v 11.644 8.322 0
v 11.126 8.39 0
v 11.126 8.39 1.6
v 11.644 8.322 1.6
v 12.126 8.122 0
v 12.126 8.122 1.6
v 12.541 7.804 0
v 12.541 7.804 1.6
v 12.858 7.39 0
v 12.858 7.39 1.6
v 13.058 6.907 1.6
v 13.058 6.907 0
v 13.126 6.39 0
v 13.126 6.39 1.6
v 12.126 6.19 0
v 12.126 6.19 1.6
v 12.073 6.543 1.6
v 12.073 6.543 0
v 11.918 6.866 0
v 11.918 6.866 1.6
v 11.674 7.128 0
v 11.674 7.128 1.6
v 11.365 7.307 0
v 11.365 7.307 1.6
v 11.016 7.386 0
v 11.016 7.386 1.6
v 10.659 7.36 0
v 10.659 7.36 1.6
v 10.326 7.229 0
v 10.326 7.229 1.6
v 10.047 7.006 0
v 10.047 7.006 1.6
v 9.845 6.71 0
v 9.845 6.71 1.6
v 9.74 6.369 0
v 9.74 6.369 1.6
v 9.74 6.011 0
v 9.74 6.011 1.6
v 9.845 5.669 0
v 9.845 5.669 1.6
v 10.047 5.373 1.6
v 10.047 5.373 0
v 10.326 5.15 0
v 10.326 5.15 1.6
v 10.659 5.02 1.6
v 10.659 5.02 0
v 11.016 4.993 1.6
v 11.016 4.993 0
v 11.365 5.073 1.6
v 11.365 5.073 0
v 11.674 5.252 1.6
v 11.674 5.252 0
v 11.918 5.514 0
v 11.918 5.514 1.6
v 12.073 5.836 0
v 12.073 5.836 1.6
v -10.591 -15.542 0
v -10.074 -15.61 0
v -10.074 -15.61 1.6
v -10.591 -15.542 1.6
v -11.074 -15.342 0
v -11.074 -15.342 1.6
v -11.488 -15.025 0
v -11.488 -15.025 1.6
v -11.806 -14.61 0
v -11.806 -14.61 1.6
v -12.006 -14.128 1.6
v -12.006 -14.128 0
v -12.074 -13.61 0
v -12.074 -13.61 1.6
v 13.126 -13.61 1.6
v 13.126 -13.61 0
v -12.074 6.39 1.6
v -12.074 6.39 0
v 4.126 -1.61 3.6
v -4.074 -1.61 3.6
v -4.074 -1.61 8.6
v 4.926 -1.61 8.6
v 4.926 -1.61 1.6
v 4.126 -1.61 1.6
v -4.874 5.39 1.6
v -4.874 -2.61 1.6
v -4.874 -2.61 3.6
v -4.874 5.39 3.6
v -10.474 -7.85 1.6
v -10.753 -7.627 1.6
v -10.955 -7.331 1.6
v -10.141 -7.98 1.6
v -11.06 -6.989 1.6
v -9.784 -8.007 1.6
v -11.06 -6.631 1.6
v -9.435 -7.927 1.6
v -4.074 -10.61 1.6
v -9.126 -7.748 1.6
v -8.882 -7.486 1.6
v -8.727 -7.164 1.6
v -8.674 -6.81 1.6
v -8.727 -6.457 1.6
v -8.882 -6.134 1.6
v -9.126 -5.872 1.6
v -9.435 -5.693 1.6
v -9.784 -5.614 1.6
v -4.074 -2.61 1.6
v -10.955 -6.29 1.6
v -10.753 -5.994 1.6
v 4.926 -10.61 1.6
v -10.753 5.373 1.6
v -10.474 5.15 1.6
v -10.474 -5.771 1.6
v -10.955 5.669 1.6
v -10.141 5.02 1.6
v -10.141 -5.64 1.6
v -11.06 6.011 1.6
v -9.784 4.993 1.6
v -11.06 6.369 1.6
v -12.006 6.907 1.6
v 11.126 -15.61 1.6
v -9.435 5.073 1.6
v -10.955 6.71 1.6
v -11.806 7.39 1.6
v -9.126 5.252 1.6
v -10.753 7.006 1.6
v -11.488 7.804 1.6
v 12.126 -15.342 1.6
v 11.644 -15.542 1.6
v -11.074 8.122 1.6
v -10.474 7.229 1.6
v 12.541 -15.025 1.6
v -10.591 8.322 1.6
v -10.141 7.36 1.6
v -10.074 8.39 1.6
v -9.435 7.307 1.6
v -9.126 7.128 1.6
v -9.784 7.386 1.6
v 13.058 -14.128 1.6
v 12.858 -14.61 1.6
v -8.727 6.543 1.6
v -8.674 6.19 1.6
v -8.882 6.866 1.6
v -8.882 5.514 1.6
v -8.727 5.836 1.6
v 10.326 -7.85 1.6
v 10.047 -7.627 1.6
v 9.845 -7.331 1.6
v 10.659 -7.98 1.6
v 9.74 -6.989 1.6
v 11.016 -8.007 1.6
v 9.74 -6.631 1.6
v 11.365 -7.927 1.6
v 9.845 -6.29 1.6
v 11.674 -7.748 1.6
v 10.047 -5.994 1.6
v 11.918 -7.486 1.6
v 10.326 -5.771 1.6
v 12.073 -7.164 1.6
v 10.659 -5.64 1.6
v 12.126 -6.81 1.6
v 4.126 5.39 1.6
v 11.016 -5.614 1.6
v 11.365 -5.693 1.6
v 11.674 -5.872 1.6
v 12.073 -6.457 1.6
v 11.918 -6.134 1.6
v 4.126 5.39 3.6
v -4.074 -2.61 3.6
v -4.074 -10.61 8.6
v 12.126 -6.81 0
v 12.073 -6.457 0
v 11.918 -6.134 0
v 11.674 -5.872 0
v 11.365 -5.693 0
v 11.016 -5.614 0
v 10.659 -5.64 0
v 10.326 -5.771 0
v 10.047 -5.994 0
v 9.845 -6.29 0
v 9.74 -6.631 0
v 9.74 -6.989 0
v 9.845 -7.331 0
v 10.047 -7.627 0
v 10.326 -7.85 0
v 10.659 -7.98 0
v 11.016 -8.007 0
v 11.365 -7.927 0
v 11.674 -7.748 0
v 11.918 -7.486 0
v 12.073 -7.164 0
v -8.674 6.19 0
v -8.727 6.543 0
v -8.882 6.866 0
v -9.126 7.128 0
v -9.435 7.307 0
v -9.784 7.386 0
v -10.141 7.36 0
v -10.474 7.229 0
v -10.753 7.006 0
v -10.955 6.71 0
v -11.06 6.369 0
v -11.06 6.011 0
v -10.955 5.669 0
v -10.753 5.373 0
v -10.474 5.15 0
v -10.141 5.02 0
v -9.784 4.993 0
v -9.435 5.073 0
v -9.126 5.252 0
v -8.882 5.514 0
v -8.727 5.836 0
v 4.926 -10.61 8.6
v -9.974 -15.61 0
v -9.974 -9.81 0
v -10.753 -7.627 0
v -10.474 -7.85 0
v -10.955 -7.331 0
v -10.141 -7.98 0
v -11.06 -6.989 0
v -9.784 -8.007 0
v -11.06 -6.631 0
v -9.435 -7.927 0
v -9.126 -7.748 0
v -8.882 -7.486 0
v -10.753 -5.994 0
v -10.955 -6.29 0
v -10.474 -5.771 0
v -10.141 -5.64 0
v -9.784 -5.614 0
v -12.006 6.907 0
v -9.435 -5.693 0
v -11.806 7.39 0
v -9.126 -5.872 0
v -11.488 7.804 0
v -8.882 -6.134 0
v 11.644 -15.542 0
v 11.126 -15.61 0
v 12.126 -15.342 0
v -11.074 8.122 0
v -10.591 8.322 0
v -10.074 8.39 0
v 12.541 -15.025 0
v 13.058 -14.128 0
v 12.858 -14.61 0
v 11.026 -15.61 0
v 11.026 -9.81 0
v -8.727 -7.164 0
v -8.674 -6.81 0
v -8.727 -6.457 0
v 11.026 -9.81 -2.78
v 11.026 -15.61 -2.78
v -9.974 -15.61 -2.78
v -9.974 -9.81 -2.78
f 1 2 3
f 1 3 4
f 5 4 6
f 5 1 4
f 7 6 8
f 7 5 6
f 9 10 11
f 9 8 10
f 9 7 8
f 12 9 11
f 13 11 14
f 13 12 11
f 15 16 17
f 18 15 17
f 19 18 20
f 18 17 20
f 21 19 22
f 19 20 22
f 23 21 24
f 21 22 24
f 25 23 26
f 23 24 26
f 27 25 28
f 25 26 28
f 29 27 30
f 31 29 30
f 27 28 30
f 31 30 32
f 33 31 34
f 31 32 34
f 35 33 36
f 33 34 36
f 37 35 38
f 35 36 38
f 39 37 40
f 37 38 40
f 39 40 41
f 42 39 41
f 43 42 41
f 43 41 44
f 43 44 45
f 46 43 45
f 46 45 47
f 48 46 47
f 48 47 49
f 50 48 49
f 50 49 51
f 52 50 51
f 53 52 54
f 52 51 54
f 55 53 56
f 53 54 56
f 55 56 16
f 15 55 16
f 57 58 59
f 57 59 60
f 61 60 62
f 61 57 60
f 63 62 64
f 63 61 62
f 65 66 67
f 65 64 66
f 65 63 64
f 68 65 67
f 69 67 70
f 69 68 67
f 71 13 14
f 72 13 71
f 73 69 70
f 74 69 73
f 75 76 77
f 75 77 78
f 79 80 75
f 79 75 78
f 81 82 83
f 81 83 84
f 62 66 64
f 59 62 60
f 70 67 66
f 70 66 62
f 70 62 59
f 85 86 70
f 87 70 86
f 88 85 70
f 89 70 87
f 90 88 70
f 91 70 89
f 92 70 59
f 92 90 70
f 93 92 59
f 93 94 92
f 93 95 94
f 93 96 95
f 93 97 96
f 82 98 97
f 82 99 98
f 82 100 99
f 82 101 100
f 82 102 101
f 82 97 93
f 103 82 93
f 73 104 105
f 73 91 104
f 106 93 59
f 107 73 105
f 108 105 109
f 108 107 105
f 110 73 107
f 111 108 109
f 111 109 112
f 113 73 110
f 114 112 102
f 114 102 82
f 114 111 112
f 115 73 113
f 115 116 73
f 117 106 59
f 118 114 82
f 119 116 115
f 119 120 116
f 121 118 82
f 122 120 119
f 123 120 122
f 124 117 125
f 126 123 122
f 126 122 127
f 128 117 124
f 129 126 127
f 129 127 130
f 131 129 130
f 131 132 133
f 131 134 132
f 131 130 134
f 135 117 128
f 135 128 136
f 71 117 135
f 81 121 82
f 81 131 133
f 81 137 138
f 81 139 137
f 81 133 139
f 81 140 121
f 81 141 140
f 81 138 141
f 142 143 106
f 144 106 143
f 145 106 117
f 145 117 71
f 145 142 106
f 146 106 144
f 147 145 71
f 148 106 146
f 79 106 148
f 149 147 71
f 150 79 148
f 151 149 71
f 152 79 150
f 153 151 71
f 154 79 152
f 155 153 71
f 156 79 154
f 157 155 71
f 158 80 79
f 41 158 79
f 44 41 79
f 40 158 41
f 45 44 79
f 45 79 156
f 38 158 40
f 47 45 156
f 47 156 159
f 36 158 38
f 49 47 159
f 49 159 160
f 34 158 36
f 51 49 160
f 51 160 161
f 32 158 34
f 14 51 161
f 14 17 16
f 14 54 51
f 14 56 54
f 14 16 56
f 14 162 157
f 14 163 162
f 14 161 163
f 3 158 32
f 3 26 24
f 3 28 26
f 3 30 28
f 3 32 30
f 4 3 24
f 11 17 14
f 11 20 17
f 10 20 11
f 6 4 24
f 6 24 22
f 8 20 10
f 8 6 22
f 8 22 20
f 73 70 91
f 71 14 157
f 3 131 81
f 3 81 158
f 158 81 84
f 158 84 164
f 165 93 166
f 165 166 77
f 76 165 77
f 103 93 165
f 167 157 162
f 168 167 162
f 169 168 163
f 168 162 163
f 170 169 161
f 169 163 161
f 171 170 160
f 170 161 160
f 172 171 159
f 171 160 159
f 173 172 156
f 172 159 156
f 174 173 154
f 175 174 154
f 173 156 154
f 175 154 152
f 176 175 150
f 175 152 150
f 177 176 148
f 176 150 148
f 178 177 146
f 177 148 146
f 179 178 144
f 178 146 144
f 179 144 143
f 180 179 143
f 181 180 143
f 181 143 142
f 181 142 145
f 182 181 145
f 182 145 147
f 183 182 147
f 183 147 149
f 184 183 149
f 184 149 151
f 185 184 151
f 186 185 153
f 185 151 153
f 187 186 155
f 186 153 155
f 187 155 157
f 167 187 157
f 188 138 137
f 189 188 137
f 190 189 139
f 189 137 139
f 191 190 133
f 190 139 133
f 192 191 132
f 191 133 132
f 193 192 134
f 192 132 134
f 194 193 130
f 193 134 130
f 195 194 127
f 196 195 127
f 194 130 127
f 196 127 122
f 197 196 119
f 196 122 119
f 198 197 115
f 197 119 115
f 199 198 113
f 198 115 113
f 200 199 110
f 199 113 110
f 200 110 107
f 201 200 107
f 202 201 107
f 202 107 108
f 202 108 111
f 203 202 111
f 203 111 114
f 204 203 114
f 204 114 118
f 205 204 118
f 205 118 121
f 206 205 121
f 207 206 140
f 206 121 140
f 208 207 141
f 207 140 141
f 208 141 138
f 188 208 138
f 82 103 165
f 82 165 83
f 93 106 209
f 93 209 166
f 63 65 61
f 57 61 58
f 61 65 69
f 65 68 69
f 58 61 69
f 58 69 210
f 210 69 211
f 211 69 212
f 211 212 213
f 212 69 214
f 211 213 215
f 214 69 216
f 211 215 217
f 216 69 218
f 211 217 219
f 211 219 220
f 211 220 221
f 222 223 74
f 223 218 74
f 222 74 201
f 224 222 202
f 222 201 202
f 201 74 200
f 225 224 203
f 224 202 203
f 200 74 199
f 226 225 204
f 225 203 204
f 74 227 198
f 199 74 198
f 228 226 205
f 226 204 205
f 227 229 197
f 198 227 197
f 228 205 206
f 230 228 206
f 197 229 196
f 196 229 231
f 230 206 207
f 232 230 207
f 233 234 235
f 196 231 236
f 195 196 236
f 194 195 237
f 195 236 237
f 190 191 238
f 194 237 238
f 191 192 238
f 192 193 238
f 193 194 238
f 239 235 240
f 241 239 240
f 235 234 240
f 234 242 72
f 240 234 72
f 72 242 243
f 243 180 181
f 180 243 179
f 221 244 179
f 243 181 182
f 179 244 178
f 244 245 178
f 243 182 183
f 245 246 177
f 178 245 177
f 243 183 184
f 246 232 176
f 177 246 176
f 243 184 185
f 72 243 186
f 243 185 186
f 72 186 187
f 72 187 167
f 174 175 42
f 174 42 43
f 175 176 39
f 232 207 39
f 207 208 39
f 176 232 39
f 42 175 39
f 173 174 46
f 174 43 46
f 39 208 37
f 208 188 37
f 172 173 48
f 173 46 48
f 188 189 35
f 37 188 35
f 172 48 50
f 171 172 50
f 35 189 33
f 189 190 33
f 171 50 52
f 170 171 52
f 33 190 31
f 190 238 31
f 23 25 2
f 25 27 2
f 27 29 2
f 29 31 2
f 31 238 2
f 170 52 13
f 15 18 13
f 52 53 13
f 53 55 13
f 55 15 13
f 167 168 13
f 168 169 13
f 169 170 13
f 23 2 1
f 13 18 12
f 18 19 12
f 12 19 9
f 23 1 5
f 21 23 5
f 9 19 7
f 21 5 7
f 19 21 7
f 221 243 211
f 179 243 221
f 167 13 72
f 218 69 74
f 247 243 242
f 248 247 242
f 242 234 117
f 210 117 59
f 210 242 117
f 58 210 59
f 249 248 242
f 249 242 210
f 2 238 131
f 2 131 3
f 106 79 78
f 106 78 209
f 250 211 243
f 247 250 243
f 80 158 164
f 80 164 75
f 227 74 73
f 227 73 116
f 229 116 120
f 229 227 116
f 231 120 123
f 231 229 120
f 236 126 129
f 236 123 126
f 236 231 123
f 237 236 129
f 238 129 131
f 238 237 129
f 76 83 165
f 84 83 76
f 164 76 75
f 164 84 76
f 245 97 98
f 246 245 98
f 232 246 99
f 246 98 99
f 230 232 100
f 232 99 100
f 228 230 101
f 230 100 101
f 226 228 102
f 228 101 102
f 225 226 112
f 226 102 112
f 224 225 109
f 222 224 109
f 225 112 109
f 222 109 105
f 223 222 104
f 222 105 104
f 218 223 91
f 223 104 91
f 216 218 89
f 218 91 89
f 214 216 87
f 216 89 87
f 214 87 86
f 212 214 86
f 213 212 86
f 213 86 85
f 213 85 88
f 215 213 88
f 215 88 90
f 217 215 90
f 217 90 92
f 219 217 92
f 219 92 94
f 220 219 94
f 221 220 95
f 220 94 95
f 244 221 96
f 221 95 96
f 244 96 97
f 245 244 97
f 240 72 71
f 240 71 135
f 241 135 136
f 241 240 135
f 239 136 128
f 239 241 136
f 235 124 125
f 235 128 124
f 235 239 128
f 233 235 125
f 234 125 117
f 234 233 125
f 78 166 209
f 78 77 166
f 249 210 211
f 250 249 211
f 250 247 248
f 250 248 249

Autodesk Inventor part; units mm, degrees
ref_plane "YZ Plane" through (0, 0, 0) normal (1, 0, 0) x (0, 1, 0)
ref_plane "XZ Plane" through (0, 0, 0) normal (0, 1, 0) x (-1, 0, 0)
ref_plane "XY Plane" through (0, 0, 0) normal (0, 0, 1) x (1, 0, 0)
sketch "Sketch2" plane through (0, 0, 0) normal (0, 0, 1) x (1, 0, 0)
  line L0 (-10.0737, 8.3897) -> (11.1263, 8.3897)
  line L1 (13.1263, 6.3897) -> (13.1263, -13.6103)
  line L2 (11.1263, -15.6103) -> (-10.0737, -15.6103)
  line L3 (-12.0737, -13.6103) -> (-12.0737, 6.3897)
  arc A0 (-10.0737, 8.3897) -> (-12.0737, 6.3897) centre (-10.0737, 6.3897) ccw
  arc A1 (13.1263, 6.3897) -> (11.1263, 8.3897) centre (11.1263, 6.3897) ccw
  arc A2 (11.1263, -15.6103) -> (13.1263, -13.6103) centre (11.1263, -13.6103) ccw
  arc A3 (-12.0737, -13.6103) -> (-10.0737, -15.6103) centre (-10.0737, -13.6103) ccw
  point P0 (0, 0)
  point P1 (-12.0737, 8.3897)
  point P2 (13.1263, -15.6103)
  point P3 (13.1263, 8.3897)
  point P4 (-12.0737, -15.6103)
  dimension "d0" = 25.2
  dimension "d1" = 24
  dimension "d4" = 2
extrude "Extrusion1" add sketch "Sketch2" along normal blind 1.6
sketch "Sketch3" plane through (0, 0, 1.6) normal (0, 0, 1) x (1, 0, 0)
  circle A0 centre (-9.8737, 6.1897) radius 1.2
  circle A1 centre (10.9263, 6.1897) radius 1.2
  circle A2 centre (10.9263, -6.8103) radius 1.2
  circle A3 centre (-9.8737, -6.8103) radius 1.2
  line L0 (11.1263, 8.3897) -> (-10.0737, 8.3897) projected
  line L1 (-12.0737, 6.3897) -> (-12.0737, -13.6103) projected
  line L2 (13.1263, -13.6103) -> (13.1263, 6.3897) projected
  point P0 (0, 0)
  dimension "d5" = 2.4
  dimension "d6" = 2.4
  dimension "d7" = 2.4
  dimension "d8" = 2.4
  dimension "d9" = 2.2
  dimension "d10" = 2.2
  dimension "d11" = 2.2
  dimension "d12" = 2.2
  dimension "d13" = 2.2
  dimension "d14" = 2.2
  dimension "d15" = 13
  dimension "d16" = 13
extrude "Extrusion2" cut sketch "Sketch3" against normal up to next
sketch "Sketch4" plane through (0, 0, 1.6) normal (0, 0, 1) x (1, 0, 0)
  line L0 (-4.8737, 5.3897) -> (4.1263, 5.3897)
  line L1 (4.1263, 5.3897) -> (4.1263, -2.6103)
  line L2 (4.1263, -2.6103) -> (-4.8737, -2.6103)
  line L3 (-4.8737, -2.6103) -> (-4.8737, 5.3897)
  line L4 (11.1263, 8.3897) -> (-10.0737, 8.3897) projected
  line L5 (13.1263, -13.6103) -> (13.1263, 6.3897) projected
  point P0 (0, 0)
  dimension "d19" = 9
  dimension "d20" = 8
  dimension "d21" = 3
  dimension "d22" = 9
extrude "Extrusion3" add sketch "Sketch4" along normal blind 2
sketch "Sketch5" plane through (0, 0, 1.6) normal (0, 0, 1) x (1, 0, 0)
  line L0 (-4.0737, -1.6103) -> (4.9263, -1.6103)
  line L1 (4.9263, -1.6103) -> (4.9263, -10.6103)
  line L2 (4.9263, -10.6103) -> (-4.0737, -10.6103)
  line L3 (-4.0737, -10.6103) -> (-4.0737, -1.6103)
  line L4 (-10.0737, -15.6103) -> (11.1263, -15.6103) projected
  line L5 (-12.0737, 6.3897) -> (-12.0737, -13.6103) projected
  point P0 (0, 0)
  dimension "d25" = 9
  dimension "d26" = 9
  dimension "d27" = 5
  dimension "d28" = 8
extrude "Extrusion4" add sketch "Sketch5" along normal blind 7
sketch "Sketch6" plane through (0, 0, 0) normal (0, 0, -1) x (-1, 0, 0)
  line L0 (10.0737, -15.6103) -> (-11.1263, -15.6103) projected
  line L1 (-11.0263, -15.6103) -> (9.9737, -15.6103)
  line L2 (9.9737, -15.6103) -> (9.9737, -9.8103)
  line L3 (9.9737, -9.8103) -> (-11.0263, -9.8103)
  line L4 (-11.0263, -9.8103) -> (-11.0263, -15.6103)
  line L5 (-13.1263, 6.3897) -> (-13.1263, -13.6103) projected
  point P0 (0, 0)
  dimension "d31" = 21
  dimension "d32" = 5.8
  dimension "d33" = 2.1
extrude "Extrusion5" add sketch "Sketch6" along normal blind 2.78
equation "\"d6\" = d5"
equation "\"d7\" = d5"
equation "\"d8\" = d5"
equation "\"d10\" = d9"
equation "\"d11\" = d9"
equation "\"d12\" = d9"
equation "\"d13\" = d9"
equation "\"d14\" = d9"
equation "\"d16\" = d15"
equation "\"d33\" = -0.5 * d31 + 0.5 * d0"
properties part number "RasPIcam"
